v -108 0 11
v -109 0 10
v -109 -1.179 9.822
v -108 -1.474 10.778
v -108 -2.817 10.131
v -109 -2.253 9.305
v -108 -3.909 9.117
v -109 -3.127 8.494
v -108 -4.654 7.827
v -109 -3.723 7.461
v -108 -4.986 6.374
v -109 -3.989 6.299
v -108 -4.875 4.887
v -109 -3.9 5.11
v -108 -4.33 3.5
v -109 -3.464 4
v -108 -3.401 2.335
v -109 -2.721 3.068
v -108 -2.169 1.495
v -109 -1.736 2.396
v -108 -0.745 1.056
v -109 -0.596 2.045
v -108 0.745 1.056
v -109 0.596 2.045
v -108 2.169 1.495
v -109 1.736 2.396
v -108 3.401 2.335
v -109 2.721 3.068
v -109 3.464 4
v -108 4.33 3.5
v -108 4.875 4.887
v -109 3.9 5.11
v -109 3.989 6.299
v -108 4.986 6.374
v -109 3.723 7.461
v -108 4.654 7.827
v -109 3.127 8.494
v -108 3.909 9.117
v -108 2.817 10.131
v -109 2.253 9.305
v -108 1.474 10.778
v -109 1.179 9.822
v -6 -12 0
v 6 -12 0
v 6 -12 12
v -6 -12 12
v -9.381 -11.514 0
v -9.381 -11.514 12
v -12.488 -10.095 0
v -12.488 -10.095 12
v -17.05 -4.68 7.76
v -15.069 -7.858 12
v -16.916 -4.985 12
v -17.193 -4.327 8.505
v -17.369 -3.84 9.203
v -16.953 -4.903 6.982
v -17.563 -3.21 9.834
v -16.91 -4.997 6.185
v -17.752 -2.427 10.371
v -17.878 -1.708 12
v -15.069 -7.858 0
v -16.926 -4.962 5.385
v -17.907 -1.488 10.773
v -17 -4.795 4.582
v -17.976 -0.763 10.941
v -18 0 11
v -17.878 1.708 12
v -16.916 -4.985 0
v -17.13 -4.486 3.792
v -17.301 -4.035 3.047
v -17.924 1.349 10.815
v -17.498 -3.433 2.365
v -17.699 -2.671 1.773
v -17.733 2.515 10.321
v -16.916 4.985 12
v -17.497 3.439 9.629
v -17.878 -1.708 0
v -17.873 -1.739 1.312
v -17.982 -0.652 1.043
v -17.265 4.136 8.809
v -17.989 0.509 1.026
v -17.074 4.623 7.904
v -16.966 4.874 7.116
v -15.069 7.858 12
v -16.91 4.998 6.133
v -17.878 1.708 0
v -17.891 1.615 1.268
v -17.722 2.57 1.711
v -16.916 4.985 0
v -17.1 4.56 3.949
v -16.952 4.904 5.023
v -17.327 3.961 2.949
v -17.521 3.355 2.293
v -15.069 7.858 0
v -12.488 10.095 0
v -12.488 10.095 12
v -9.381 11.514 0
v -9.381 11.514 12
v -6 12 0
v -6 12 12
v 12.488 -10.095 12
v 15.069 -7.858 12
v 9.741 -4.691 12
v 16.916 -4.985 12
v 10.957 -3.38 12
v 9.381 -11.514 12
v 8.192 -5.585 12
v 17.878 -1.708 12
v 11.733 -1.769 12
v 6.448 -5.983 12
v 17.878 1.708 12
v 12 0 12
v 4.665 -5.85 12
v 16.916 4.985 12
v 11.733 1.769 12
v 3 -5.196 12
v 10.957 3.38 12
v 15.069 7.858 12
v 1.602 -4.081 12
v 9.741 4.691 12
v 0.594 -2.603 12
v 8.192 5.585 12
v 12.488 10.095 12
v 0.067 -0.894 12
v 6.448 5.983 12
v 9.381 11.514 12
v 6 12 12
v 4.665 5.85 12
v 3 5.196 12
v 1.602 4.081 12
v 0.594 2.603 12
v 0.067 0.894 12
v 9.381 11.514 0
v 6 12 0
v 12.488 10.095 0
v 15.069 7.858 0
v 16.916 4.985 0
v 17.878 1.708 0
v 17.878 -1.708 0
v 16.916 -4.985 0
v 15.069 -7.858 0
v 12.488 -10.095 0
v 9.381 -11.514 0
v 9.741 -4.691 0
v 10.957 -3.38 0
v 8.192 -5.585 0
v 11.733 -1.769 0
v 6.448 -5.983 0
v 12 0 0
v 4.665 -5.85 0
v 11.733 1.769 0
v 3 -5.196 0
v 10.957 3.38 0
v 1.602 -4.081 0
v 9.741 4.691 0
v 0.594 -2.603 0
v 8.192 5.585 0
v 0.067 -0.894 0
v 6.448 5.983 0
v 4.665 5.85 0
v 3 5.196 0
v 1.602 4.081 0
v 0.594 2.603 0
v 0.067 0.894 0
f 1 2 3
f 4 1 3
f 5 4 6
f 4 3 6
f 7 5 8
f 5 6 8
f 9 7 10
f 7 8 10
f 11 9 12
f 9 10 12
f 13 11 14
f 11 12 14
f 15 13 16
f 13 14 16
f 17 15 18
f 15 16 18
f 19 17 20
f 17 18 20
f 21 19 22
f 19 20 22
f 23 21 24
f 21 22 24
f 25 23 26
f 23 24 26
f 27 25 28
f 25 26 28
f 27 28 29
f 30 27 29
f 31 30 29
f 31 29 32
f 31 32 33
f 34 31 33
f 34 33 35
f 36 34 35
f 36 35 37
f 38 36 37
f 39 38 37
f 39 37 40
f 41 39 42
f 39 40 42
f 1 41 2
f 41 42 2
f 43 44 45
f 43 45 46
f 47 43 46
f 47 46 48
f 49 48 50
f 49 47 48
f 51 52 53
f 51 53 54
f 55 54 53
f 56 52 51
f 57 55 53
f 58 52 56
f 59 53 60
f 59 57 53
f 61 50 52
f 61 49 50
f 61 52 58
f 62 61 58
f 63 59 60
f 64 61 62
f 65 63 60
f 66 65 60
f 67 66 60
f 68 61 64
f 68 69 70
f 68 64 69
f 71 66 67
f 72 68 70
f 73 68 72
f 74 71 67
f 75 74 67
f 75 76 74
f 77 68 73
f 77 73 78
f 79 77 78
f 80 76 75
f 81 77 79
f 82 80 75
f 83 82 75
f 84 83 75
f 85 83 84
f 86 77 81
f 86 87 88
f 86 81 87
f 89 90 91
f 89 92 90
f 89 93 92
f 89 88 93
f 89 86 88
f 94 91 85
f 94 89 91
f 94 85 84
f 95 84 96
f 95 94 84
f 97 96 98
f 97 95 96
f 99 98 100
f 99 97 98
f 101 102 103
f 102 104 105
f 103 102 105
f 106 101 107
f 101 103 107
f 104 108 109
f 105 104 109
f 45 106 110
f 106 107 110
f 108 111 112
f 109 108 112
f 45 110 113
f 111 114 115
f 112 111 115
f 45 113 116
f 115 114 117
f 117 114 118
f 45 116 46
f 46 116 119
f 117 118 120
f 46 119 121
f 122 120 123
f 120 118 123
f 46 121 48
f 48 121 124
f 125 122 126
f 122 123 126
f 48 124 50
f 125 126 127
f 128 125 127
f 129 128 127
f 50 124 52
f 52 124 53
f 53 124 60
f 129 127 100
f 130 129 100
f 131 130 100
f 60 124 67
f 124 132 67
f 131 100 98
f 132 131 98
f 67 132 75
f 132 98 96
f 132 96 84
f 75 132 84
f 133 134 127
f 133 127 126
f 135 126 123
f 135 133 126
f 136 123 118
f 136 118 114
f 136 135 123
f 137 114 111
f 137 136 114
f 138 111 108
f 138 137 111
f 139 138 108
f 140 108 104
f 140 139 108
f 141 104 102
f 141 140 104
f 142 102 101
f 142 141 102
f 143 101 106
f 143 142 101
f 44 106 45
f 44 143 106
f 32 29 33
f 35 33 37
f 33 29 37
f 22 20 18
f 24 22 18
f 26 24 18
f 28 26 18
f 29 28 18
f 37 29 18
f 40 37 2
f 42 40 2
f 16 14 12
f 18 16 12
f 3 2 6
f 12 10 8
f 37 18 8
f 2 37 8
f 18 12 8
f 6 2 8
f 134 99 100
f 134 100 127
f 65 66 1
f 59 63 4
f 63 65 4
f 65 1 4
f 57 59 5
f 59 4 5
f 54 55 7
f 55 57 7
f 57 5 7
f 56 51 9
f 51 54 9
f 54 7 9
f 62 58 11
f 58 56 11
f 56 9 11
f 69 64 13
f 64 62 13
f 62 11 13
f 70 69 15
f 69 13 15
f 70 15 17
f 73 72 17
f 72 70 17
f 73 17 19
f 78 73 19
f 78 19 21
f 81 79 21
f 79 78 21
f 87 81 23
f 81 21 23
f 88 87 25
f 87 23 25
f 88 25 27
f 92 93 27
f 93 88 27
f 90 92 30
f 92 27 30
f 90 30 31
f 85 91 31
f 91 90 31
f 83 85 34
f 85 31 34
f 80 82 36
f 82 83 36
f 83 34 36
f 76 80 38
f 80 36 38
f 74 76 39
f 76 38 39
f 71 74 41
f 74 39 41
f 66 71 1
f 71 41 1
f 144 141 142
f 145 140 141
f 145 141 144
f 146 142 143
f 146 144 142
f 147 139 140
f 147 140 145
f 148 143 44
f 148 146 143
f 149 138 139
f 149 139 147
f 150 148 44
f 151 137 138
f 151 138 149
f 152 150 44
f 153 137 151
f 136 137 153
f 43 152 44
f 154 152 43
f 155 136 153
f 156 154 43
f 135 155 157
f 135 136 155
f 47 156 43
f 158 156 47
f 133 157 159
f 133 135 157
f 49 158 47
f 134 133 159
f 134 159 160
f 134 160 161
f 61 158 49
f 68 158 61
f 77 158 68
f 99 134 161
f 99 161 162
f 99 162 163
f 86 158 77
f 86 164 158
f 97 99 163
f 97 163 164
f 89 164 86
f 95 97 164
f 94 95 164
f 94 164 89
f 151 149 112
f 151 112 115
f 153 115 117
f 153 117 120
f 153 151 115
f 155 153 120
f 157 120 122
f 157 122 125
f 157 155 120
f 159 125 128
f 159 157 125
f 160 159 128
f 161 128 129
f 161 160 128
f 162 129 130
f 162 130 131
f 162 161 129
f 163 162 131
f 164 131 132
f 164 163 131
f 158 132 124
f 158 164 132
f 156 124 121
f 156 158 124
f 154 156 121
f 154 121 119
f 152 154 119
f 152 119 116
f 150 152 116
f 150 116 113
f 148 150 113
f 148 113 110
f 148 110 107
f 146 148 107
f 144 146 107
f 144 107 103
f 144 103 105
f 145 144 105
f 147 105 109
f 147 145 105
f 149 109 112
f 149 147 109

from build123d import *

# Parameters (mm, degrees)
SCHIZZO1_R                        = 6
ESTRUSIONE_ESTRUSIONE1_DEPTH      = 12
ESTRUSIONE_ESTRUSIONE2_REACH      = 130.129
ESTRUSIONE_ESTRUSIONE2_END_RADIUS = 12
SCHIZZO2_R                        = 5
SMUSSO1_SIZE                      = 1


with BuildPart() as part:
    # Schizzo1 → Estrusione-Estrusione1 (new body)
    with BuildSketch(Plane.XY):
        with BuildLine():
            Line((-6, 12), (6, 12))
            ThreePointArc((6, 12), (18, 0), (6, -12))
            Line((6, -12), (-6, -12))
            ThreePointArc((-6, -12), (-18, 0), (-6, 12))
        make_face()
        with Locations((6, 0)):
            Circle(SCHIZZO1_R, mode=Mode.SUBTRACT)
    extrude(amount=ESTRUSIONE_ESTRUSIONE1_DEPTH)

    # Estrusione-Estrusione2: up to this cylinder (the profile starts outside it)
    estrusione_estrusione2_end = Plane(origin=(-6, 0, 6), z_dir=(0, 0, -1)) * Cylinder(ESTRUSIONE_ESTRUSIONE2_END_RADIUS, 285.258, mode=Mode.PRIVATE)
    # Schizzo2 → Estrusione-Estrusione2 (add, up to the surface)
    with BuildSketch(Plane(origin=(-109, 0, 0), x_dir=(0, 0, -1), z_dir=(1, 0, 0)), mode=Mode.PRIVATE) as estrusione_estrusione2_sk1:
        with Locations(Location((-6, 0, 0), (0, 0, 180))):
            Circle(SCHIZZO2_R)
    estrusione_estrusione2_tool1 = extrude(estrusione_estrusione2_sk1.sketch, amount=ESTRUSIONE_ESTRUSIONE2_REACH, mode=Mode.PRIVATE) - estrusione_estrusione2_end
    add(estrusione_estrusione2_tool1.solids().sort_by_distance((-109, 0, 6))[0])

    # Smusso1
    smusso1_edges = [part.edges().sort_by_distance(p)[0] for p in [
        (-109, 0, 1),
    ]]
    chamfer(smusso1_edges, length=SMUSSO1_SIZE)


solid = part.part
